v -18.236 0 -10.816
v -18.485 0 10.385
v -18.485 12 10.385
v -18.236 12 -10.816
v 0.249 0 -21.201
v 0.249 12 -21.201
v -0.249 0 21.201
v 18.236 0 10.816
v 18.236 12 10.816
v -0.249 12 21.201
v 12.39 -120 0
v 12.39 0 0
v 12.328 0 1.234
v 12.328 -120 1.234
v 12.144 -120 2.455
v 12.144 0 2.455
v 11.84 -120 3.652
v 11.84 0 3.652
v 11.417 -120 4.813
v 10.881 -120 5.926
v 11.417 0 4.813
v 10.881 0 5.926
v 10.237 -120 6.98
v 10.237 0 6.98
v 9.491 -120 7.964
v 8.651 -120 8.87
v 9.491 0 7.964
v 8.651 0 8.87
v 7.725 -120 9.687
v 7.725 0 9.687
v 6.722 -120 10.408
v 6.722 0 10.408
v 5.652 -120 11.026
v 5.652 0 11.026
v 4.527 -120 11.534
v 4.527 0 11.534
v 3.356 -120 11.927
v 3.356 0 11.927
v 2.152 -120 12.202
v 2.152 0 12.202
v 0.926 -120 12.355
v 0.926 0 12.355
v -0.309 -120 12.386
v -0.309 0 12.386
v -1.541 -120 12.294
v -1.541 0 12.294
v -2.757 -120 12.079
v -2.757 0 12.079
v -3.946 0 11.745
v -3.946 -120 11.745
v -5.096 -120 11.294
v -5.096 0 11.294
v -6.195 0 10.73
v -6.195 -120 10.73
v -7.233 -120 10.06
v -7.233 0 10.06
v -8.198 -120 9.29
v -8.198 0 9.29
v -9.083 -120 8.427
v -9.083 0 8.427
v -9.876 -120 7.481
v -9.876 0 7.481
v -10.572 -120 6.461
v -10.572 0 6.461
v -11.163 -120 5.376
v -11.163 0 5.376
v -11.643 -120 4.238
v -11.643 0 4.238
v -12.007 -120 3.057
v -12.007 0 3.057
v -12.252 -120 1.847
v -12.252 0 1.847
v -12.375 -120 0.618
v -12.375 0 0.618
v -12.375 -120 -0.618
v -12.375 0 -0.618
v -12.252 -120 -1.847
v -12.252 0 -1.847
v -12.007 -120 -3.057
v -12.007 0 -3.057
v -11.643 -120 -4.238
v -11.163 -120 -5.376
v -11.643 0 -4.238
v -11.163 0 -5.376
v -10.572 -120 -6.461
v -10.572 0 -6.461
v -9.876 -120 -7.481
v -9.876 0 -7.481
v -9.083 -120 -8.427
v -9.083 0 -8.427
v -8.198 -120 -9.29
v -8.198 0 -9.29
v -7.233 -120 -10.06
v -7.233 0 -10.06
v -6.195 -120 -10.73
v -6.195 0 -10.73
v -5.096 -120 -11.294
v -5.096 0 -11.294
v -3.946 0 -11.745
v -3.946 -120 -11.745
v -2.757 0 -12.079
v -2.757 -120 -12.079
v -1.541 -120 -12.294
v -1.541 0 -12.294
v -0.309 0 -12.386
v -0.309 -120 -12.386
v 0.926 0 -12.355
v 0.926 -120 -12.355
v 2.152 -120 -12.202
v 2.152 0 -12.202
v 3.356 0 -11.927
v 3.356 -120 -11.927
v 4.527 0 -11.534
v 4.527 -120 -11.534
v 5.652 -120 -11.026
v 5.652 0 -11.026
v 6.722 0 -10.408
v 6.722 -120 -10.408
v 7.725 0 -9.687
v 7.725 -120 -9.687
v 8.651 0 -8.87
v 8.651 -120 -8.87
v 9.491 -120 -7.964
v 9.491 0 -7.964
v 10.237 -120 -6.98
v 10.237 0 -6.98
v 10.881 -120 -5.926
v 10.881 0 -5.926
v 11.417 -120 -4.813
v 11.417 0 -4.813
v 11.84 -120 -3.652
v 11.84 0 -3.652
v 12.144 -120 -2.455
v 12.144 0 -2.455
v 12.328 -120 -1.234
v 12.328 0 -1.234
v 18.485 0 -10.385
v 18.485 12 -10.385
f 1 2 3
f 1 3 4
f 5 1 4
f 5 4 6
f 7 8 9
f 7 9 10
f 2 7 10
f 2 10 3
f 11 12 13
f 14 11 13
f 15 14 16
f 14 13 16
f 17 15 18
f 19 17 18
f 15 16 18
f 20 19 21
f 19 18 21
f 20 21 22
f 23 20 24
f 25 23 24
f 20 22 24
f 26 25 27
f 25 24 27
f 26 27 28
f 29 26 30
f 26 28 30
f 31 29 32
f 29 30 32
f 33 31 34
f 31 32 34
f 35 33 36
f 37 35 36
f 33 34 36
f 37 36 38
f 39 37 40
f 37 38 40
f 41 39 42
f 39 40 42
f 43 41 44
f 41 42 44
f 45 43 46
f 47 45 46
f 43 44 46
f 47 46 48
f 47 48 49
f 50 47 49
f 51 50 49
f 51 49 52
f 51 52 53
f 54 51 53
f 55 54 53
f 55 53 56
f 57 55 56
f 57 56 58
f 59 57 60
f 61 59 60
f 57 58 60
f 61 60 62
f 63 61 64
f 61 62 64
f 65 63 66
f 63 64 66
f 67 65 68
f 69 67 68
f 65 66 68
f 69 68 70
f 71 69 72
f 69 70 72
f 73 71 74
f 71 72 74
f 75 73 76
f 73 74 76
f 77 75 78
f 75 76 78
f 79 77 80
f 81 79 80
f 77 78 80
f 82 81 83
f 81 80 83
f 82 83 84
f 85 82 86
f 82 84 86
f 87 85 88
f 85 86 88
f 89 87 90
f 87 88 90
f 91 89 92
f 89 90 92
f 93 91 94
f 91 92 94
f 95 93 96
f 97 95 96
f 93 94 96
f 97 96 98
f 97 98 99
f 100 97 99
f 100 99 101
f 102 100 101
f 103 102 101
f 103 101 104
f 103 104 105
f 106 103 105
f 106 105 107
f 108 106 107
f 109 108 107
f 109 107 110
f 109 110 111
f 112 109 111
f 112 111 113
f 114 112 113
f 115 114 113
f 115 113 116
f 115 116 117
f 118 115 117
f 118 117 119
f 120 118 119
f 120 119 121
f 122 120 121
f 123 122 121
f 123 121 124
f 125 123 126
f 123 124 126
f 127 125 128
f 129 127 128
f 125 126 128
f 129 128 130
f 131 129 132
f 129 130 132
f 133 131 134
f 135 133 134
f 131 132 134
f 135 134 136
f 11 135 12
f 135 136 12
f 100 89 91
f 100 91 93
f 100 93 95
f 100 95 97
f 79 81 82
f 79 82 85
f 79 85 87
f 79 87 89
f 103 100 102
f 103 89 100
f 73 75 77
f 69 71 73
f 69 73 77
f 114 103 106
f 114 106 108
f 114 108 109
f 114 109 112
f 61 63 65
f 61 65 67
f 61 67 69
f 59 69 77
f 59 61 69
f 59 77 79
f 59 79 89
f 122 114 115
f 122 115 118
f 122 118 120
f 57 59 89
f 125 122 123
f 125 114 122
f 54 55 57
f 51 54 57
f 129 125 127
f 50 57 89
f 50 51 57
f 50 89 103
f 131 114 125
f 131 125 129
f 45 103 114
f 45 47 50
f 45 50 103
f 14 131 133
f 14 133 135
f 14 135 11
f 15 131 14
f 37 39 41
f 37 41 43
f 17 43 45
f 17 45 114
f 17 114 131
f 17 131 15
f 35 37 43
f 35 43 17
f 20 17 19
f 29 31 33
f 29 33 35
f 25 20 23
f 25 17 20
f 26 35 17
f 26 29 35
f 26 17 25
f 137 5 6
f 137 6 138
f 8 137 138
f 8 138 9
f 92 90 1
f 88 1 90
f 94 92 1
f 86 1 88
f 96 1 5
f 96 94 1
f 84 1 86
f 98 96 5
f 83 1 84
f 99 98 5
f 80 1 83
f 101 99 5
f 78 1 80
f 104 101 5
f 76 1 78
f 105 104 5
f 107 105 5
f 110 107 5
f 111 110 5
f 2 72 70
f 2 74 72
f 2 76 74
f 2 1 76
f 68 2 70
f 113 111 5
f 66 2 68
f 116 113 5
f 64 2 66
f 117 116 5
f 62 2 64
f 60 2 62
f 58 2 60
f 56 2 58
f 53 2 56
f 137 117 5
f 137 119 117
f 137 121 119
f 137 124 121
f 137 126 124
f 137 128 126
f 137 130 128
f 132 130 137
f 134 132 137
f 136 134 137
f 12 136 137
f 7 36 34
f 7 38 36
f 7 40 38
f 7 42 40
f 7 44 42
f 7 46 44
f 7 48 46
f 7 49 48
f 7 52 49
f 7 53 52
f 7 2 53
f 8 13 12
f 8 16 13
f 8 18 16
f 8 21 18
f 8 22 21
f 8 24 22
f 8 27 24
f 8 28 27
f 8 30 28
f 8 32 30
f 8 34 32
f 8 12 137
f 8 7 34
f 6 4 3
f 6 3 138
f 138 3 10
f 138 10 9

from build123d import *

# Parameters (mm, degrees)
F1_DEPTH = 12
F2_R     = 12.39
F3_DEPTH = 120


with BuildPart() as f1:
    # F0 (on Front) → F1 (new body)
    with BuildSketch(Plane.XZ):
        Polygon((-0.24929, 21.200885), (-18.48515, 10.384551), (-18.23586, -10.816334), (0.24929, -21.200885), (18.48515, -10.384551), (18.23586, 10.816334), align=None)
    extrude(amount=-F1_DEPTH)

    # F2 (on face) → F3 (join)
    with BuildSketch(Plane.XZ):
        Circle(F2_R)
    extrude(amount=F3_DEPTH)


solid = f1.part
